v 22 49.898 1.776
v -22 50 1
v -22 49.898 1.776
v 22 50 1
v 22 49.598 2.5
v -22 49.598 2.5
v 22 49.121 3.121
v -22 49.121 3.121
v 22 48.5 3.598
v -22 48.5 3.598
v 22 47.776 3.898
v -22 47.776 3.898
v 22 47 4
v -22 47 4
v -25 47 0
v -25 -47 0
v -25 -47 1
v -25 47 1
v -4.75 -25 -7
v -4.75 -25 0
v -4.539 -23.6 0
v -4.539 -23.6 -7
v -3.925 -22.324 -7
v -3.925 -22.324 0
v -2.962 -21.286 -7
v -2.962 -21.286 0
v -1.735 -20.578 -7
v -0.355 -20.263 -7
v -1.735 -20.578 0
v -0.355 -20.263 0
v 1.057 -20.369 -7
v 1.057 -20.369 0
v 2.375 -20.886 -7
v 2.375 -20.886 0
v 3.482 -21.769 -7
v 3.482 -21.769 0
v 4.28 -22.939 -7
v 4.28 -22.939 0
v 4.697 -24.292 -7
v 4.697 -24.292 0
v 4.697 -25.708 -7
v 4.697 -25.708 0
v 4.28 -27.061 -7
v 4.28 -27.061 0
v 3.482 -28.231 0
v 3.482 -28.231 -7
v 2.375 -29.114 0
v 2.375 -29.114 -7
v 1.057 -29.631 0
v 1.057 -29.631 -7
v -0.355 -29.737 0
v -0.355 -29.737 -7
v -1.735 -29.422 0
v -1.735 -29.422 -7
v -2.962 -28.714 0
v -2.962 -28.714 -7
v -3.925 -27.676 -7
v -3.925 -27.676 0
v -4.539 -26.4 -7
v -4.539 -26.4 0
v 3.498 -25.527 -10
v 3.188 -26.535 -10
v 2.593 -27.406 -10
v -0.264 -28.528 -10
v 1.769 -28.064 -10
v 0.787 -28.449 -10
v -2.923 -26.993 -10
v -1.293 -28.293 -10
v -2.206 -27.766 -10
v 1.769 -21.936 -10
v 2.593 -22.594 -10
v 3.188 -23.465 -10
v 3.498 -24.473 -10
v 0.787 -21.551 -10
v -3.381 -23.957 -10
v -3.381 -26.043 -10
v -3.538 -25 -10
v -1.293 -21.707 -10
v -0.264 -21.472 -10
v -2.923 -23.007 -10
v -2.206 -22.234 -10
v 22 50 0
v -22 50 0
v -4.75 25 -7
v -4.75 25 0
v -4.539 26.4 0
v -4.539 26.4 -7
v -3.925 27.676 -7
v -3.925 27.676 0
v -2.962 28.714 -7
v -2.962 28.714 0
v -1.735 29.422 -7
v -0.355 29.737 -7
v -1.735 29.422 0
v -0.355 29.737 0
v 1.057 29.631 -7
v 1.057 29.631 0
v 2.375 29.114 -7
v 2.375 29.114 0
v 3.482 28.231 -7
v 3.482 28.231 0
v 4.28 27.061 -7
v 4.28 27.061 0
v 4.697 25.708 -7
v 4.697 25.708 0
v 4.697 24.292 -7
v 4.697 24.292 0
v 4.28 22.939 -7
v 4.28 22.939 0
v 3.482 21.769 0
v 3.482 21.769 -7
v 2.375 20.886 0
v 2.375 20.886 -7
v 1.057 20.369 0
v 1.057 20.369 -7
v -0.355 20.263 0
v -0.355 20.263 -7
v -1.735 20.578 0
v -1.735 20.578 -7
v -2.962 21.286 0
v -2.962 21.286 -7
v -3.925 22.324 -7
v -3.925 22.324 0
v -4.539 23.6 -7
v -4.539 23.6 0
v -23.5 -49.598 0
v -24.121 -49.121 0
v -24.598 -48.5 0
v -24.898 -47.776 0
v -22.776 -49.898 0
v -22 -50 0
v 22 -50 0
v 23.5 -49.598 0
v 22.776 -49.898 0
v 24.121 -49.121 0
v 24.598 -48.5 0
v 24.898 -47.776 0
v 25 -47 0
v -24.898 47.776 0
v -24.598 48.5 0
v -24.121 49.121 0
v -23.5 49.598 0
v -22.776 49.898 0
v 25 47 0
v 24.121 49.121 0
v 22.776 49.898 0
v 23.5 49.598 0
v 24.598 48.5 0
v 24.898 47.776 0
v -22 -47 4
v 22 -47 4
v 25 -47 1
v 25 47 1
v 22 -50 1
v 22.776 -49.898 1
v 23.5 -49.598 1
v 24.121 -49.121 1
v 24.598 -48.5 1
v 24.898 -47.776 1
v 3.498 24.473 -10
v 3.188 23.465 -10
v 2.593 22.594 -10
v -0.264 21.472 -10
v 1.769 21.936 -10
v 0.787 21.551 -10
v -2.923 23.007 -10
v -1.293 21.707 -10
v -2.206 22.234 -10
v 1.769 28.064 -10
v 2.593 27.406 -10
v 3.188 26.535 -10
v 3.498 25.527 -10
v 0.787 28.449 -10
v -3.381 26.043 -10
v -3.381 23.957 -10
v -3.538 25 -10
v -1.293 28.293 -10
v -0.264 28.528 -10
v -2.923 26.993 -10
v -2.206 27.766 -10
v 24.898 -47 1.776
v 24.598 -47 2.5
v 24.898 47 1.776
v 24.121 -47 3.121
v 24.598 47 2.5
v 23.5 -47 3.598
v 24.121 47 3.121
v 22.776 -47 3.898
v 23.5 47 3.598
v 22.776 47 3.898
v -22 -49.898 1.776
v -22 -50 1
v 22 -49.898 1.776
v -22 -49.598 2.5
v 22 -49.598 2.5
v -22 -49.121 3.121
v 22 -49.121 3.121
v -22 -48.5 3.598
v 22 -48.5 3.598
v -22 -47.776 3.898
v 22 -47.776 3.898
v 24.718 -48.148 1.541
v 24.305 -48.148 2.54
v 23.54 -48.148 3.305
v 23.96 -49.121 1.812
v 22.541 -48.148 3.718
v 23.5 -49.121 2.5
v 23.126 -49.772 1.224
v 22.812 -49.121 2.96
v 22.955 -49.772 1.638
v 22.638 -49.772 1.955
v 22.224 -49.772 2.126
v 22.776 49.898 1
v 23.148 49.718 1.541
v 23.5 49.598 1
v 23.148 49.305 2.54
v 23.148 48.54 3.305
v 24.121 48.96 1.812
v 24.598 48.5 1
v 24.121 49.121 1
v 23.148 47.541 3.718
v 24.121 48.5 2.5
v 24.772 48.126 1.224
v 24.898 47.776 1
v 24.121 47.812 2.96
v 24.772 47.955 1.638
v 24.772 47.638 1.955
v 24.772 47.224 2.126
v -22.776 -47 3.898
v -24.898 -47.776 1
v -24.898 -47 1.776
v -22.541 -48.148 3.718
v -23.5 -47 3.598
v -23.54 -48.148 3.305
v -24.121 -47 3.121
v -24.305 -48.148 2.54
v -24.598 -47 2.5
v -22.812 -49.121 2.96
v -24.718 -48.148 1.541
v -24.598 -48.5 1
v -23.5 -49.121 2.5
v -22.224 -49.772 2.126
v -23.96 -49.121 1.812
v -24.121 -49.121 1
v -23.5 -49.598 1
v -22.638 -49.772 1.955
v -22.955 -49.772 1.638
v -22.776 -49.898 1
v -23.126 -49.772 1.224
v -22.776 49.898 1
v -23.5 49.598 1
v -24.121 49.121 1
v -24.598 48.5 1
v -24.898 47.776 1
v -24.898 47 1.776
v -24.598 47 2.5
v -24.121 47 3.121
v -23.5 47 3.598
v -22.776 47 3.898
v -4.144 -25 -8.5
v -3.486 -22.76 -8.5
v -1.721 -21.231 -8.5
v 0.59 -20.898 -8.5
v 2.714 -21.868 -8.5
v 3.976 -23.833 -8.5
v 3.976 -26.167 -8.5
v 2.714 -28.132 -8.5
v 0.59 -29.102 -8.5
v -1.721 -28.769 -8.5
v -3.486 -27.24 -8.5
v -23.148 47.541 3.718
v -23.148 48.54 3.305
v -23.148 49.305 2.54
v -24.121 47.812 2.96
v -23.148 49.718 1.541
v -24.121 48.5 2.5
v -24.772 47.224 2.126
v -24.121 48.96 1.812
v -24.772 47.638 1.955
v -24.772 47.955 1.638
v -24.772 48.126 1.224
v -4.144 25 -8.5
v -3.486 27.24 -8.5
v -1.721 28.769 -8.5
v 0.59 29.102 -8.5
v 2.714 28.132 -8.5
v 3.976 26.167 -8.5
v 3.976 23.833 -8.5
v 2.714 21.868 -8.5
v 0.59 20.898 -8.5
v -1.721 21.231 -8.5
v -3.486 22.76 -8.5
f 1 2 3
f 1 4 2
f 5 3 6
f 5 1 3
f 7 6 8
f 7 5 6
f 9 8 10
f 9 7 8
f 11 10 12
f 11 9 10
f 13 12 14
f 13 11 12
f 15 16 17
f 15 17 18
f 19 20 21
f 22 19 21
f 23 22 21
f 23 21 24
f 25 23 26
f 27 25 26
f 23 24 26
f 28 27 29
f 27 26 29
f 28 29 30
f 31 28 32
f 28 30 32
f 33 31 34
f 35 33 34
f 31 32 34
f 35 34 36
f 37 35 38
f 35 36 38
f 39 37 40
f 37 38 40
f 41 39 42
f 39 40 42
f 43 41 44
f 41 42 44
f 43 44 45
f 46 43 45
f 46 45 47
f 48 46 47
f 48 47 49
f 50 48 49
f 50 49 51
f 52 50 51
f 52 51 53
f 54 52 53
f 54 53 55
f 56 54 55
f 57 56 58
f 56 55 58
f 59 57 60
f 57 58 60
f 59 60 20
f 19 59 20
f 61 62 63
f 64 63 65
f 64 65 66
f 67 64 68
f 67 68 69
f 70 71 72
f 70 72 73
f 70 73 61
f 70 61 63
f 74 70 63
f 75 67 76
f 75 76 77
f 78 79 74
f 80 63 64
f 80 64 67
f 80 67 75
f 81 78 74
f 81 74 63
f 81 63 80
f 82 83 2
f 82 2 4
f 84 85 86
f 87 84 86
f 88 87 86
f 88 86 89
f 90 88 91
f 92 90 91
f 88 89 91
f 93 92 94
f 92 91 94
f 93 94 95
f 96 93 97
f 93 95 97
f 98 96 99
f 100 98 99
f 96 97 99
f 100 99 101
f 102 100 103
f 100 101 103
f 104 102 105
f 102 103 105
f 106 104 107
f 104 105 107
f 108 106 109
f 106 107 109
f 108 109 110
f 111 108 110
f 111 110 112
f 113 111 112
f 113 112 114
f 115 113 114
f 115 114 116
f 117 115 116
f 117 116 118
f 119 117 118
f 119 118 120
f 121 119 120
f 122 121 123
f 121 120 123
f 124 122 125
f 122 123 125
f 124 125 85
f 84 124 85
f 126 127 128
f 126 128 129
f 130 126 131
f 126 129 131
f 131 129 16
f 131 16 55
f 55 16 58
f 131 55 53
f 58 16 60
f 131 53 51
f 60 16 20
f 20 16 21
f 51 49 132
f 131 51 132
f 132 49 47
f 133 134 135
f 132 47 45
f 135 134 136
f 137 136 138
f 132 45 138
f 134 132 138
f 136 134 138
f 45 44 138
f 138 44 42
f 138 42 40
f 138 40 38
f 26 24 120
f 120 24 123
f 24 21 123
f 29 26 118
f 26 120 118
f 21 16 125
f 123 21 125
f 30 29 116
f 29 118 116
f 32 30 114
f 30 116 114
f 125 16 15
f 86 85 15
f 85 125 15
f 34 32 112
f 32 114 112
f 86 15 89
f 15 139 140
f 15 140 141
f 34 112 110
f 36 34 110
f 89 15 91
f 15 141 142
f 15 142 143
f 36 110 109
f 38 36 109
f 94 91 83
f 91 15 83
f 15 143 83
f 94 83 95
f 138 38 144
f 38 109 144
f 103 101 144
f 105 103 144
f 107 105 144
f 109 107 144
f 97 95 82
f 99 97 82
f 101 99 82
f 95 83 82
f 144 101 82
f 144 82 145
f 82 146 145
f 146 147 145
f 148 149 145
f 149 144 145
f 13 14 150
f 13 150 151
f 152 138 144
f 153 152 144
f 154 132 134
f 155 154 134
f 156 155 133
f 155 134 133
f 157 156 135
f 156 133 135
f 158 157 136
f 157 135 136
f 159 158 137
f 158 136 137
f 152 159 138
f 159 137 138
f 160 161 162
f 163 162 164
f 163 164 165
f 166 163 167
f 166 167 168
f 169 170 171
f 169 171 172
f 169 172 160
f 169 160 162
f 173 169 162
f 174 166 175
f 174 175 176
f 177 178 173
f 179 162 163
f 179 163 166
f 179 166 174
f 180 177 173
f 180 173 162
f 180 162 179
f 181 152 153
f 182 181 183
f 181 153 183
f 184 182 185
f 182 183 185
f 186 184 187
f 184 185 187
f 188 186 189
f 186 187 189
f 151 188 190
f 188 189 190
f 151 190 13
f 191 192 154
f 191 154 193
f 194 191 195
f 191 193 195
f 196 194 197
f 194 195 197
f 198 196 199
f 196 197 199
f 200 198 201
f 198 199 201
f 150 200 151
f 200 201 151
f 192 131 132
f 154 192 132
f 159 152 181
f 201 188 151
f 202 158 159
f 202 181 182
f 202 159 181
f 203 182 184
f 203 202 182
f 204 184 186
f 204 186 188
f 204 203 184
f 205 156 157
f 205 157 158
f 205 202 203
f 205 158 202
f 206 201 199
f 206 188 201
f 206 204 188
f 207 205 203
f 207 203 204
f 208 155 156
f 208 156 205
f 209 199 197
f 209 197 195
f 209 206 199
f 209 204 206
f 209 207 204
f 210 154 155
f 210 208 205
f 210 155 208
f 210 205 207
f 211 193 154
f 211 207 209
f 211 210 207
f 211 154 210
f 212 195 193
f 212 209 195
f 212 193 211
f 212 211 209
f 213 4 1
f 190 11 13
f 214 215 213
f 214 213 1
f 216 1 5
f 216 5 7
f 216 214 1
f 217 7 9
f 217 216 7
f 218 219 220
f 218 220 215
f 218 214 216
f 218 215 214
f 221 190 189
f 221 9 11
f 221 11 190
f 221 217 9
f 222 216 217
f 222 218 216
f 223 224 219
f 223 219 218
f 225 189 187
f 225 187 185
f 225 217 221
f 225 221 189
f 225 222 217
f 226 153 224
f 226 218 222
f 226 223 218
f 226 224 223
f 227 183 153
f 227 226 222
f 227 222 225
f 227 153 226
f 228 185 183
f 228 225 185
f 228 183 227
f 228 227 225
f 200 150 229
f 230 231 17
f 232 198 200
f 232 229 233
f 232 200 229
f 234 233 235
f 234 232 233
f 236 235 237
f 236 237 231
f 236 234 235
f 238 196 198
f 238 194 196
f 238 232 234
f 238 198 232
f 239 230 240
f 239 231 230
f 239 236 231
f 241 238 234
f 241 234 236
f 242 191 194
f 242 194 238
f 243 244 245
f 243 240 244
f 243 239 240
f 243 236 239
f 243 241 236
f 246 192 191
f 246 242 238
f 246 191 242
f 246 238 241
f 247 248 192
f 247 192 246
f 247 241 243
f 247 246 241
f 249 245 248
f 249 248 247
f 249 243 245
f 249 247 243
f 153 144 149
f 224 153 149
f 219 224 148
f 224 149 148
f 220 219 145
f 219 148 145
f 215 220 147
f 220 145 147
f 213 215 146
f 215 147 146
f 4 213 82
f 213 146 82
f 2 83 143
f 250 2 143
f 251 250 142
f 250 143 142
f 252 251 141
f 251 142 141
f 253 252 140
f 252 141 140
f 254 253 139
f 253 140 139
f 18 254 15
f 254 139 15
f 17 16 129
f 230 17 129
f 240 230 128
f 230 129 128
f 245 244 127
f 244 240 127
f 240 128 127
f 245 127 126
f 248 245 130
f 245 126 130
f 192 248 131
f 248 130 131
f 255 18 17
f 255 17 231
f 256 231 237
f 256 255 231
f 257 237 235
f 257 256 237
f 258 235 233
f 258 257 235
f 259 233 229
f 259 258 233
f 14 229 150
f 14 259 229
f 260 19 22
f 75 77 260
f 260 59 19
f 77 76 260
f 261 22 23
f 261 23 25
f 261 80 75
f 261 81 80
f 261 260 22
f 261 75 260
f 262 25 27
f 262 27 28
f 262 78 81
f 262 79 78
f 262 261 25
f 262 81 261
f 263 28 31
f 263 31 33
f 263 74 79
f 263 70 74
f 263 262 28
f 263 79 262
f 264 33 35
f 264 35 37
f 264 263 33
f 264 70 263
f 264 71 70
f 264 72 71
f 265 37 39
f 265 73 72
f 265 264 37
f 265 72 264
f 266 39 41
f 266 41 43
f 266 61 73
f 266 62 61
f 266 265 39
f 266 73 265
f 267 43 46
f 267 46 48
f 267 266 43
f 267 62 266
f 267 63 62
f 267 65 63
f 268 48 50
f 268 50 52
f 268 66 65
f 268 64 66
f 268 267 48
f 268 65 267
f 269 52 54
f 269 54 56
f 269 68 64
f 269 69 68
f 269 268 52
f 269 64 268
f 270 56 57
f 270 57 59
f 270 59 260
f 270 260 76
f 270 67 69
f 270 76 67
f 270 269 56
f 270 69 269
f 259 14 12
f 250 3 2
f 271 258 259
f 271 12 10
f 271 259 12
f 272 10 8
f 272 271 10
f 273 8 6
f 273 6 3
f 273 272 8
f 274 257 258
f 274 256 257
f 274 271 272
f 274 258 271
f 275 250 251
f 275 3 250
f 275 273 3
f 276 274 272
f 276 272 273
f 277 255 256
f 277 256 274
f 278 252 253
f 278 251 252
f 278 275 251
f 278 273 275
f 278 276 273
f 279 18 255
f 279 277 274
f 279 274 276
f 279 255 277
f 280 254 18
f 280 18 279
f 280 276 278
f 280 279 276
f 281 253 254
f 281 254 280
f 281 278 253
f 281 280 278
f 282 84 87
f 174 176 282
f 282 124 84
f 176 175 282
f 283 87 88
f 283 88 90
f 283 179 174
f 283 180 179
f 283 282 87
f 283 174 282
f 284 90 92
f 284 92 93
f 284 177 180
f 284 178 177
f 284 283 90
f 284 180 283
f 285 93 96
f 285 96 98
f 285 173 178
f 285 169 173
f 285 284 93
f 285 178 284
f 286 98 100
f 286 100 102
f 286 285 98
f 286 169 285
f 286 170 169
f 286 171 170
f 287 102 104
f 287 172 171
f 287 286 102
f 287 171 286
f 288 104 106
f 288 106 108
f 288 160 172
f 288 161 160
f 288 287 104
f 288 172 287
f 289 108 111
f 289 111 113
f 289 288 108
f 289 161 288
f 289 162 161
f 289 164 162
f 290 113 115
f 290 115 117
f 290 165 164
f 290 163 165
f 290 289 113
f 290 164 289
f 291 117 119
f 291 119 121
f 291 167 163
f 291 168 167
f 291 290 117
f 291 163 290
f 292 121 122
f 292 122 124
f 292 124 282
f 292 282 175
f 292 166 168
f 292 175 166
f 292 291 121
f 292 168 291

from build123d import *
from OCP.BRepFilletAPI import BRepFilletAPI_MakeChamfer

# Parameters (mm, degrees)
SKETCH1_W           = 50
SKETCH1_H           = 100
BOSS_EXTRUDE1_DEPTH = 4
FILLET1_R           = 3
FILLET2_R           = 3
SKETCH2_R           = 4.75
BOSS_EXTRUDE2_DEPTH = 10
CHAMFER1_SIZE       = 3
CHAMFER1_SIZE2      = 1.212078678


with BuildPart() as part:
    # Sketch1 → Boss-Extrude1 (new body)
    with BuildSketch(Plane.XY):
        Rectangle(SKETCH1_W, SKETCH1_H)
    extrude(amount=BOSS_EXTRUDE1_DEPTH)

    # Fillet1
    fillet1_edges = [part.edges().sort_by_distance(p)[0] for p in [
        (-25, 0, 4),
        (0, -50, 4),
        (25, 0, 4),
        (0, 50, 4),
    ]]
    fillet(fillet1_edges, radius=FILLET1_R)

    # Fillet2
    # the kernel refuses this fillet: 3 mm, written as the material it takes off along each edge
    with BuildSketch(Plane(origin=(-22, 47, 1), x_dir=(0, 1, 0), z_dir=(-1, 0, 0))) as fillet2_piece_1_section:
        Polygon((0, 0), (FILLET2_R, 0), (FILLET2_R, -FILLET2_R), (0, -FILLET2_R), align=None)
    fillet2_piece_1 = extrude(amount=FILLET2_R, mode=Mode.PRIVATE)
    fillet2_piece_1 = fillet2_piece_1 - Plane(origin=(-22, 47, 1), x_dir=(0, -0.7071067811865475, -0.7071067811865475), z_dir=(-1, 0, 0)) * Sphere(FILLET2_R, mode=Mode.PRIVATE)
    add(fillet2_piece_1, mode=Mode.SUBTRACT)
    with BuildSketch(Plane(origin=(22, 47, 1), x_dir=(0, 1, 0), z_dir=(1, 0, 0))) as fillet2_piece_2_section:
        Polygon((0, 0), (FILLET2_R, 0), (FILLET2_R, FILLET2_R), (0, FILLET2_R), align=None)
    fillet2_piece_2 = extrude(amount=FILLET2_R, mode=Mode.PRIVATE)
    fillet2_piece_2 = fillet2_piece_2 - Plane(origin=(22, 47, 1), x_dir=(0, -0.7071067811865475, -0.7071067811865475), z_dir=(1, 0, 0)) * Sphere(FILLET2_R, mode=Mode.PRIVATE)
    add(fillet2_piece_2, mode=Mode.SUBTRACT)
    with BuildSketch(Plane(origin=(-22, -47, 1), x_dir=(-1, 0, 0), z_dir=(0, -1, 0))) as fillet2_piece_3_section:
        Polygon((0, 0), (FILLET2_R, 0), (FILLET2_R, -FILLET2_R), (0, -FILLET2_R), align=None)
    fillet2_piece_3 = extrude(amount=FILLET2_R, mode=Mode.PRIVATE)
    fillet2_piece_3 = fillet2_piece_3 - Plane(origin=(-22, -47, 1), x_dir=(0.7071067811865475, 0, -0.7071067811865475), z_dir=(0, -1, 0)) * Sphere(FILLET2_R, mode=Mode.PRIVATE)
    add(fillet2_piece_3, mode=Mode.SUBTRACT)
    with BuildSketch(Plane(origin=(22, -47, 1), x_dir=(1, 0, 0), z_dir=(0, -1, 0))) as fillet2_piece_4_section:
        Polygon((0, 0), (FILLET2_R, 0), (FILLET2_R, FILLET2_R), (0, FILLET2_R), align=None)
    fillet2_piece_4 = extrude(amount=FILLET2_R, mode=Mode.PRIVATE)
    fillet2_piece_4 = fillet2_piece_4 - Plane(origin=(22, -47, 1), x_dir=(-0.7071067811865475, 0, -0.7071067811865475), z_dir=(0, -1, 0)) * Sphere(FILLET2_R, mode=Mode.PRIVATE)
    add(fillet2_piece_4, mode=Mode.SUBTRACT)
    with BuildSketch(Plane(origin=(25, -50, -7.5), x_dir=(-1, 0, 0), z_dir=(0, 0, 1)), Plane(origin=(25, 50, -7.5), x_dir=(0, -1, 0), z_dir=(0, 0, 1))) as fillet2_piece_5:
        with BuildLine():
            CenterArc((FILLET2_R, -FILLET2_R), FILLET2_R, 90, 90)
            Line((0, -FILLET2_R), (0, 0))
            Line((0, 0), (FILLET2_R, 0))
        make_face()
    extrude(amount=8.5, mode=Mode.SUBTRACT)
    with BuildSketch(Plane(origin=(-25, -50, -7.5), x_dir=(1, 0, 0), z_dir=(0, 0, 1)), Plane(origin=(-25, 50, -7.5), x_dir=(0, -1, 0), z_dir=(0, 0, 1))) as fillet2_piece_6:
        with BuildLine():
            CenterArc((FILLET2_R, FILLET2_R), FILLET2_R, 180, 90)
            Line((0, FILLET2_R), (0, 0))
            Line((0, 0), (FILLET2_R, 0))
        make_face()
    extrude(amount=8.5, mode=Mode.SUBTRACT)

    # Sketch2 → Boss-Extrude2 (add)
    with BuildSketch(Plane(origin=(0, 0, 0), x_dir=(-1, 0, 0), z_dir=(0, 0, -1))):
        with Locations((0, 25)):
            Circle(SKETCH2_R)
        with Locations((0, -25)):
            Circle(SKETCH2_R)
    extrude(amount=BOSS_EXTRUDE2_DEPTH)

    # Chamfer1: one chamfer whose edges measure the first distance from different faces: ONE call of the kernel's chamfer builder (chamfer() names one face for all edges)
    chamfer1_edges_1 = [part.edges().sort_by_distance(p)[0] for p in [
        (4.75, 25, -10),
    ]]
    chamfer1_side_1 = [part.faces().sort_by_distance(p)[0] for p in [
        (4.75, 25, -5),
    ]]
    chamfer1_edges_2 = [part.edges().sort_by_distance(p)[0] for p in [
        (4.75, -25, -10),
    ]]
    chamfer1_side_2 = [part.faces().sort_by_distance(p)[0] for p in [
        (4.75, -25, -5),
    ]]
    chamfer1 = BRepFilletAPI_MakeChamfer(part.part.solid().wrapped)
    for e in chamfer1_edges_1:
        chamfer1.Add(CHAMFER1_SIZE, CHAMFER1_SIZE2, e.wrapped, chamfer1_side_1[0].wrapped)  # the first distance lies on this face
    for e in chamfer1_edges_2:
        chamfer1.Add(CHAMFER1_SIZE, CHAMFER1_SIZE2, e.wrapped, chamfer1_side_2[0].wrapped)  # the first distance lies on this face
    add(Compound.cast(chamfer1.Shape()), mode=Mode.REPLACE)


solid = part.part
